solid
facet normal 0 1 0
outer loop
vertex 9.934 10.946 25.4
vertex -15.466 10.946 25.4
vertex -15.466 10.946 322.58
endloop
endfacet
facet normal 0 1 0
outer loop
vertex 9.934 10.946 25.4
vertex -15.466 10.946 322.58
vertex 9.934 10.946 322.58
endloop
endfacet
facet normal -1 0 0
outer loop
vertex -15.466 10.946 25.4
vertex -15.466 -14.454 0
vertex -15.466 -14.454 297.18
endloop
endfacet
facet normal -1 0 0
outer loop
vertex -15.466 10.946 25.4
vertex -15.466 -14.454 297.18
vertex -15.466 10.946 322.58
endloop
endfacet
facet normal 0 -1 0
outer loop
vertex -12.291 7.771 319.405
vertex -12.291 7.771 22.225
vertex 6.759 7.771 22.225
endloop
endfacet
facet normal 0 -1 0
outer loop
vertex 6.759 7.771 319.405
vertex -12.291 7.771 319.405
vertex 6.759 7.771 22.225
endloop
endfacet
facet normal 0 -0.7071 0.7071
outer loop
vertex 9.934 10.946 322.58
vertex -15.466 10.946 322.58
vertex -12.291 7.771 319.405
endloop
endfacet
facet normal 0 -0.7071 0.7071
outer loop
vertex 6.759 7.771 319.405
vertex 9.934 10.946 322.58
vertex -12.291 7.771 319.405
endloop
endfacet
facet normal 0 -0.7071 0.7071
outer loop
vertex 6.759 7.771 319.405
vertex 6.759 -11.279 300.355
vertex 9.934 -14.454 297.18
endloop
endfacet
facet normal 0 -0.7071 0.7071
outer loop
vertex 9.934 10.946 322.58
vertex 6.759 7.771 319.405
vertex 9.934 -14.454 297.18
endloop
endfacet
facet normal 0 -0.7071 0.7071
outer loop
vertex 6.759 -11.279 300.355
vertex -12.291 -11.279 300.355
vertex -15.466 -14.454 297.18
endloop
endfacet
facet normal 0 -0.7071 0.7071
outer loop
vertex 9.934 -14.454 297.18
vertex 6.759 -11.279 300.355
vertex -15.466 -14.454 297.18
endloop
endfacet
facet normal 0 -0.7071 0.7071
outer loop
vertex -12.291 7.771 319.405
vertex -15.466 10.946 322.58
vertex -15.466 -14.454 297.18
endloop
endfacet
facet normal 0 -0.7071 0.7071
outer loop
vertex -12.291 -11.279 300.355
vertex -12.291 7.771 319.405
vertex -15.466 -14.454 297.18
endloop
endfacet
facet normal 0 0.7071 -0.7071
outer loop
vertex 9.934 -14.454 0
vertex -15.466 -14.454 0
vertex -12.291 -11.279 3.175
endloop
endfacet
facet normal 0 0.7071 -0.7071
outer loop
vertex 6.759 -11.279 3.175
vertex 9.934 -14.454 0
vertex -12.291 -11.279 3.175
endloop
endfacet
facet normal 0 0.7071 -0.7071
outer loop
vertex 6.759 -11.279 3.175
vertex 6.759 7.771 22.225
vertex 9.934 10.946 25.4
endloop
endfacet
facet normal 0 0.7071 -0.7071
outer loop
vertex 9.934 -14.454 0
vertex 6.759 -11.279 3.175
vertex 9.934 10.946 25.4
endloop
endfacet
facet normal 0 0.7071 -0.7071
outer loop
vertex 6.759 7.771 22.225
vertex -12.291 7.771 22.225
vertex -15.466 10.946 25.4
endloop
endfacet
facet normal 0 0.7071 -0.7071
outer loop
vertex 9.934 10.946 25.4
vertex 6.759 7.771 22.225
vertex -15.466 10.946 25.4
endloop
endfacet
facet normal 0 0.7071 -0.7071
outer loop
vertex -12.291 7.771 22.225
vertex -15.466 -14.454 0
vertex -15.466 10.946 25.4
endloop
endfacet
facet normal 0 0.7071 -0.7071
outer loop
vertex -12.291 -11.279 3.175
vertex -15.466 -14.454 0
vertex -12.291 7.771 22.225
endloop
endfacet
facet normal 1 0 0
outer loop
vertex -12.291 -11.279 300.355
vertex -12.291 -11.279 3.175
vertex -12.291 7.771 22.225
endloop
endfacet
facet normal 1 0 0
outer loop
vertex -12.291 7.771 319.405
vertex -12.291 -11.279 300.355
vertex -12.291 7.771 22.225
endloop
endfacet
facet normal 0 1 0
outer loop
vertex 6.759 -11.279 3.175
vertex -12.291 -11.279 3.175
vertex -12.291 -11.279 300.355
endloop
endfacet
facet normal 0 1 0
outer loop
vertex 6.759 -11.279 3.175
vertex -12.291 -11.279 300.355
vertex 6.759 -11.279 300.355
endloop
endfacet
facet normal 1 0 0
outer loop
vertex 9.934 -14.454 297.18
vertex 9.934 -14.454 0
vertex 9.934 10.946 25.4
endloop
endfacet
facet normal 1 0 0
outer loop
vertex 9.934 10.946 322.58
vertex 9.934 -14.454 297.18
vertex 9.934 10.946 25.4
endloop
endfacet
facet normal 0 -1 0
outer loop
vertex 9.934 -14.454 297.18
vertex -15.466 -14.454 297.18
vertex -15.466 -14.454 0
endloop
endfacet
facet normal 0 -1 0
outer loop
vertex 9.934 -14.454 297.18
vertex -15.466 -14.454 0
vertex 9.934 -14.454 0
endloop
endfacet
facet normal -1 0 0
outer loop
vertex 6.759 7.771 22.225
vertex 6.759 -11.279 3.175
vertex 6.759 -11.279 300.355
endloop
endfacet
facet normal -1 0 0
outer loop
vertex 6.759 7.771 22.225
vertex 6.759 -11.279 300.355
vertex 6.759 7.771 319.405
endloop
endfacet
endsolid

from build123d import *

# Parameters (mm, degrees)
SKETCH3_W           = 25.4
SKETCH3_H           = 25.4
SKETCH3_W_2         = 19.05
SKETCH3_H_2         = 19.05
BOSS_EXTRUDE2_DEPTH = 322.58
CUT_EXTRUDE2_DEPTH  = 299.72
CUT_EXTRUDE3_DEPTH  = 25.4


with BuildPart() as part:
    # Sketch3 → Boss-Extrude2 (new body)
    with BuildSketch(Plane.XY):
        with Locations((-2.765581944, -1.754080231)):
            Rectangle(SKETCH3_W, SKETCH3_H)
        with Locations((-2.765581944, -1.754080231)):
            Rectangle(SKETCH3_W_2, SKETCH3_H_2, mode=Mode.SUBTRACT)
    extrude(amount=BOSS_EXTRUDE2_DEPTH)

    # Sketch4 → Cut-Extrude2 (cut)
    with BuildSketch(Plane.ZY.offset(15.465581944)):
        Polygon((322.58, 10.945919769), (297.18, -14.454080231), (322.58, -14.454080231), align=None)
    extrude(amount=-CUT_EXTRUDE2_DEPTH, mode=Mode.SUBTRACT)

    # Sketch5 → Cut-Extrude3 (cut)
    with BuildSketch(Plane.ZY.offset(15.465581944)):
        Polygon((0, -14.454080231), (25.4, 10.945919769), (0, 10.945919769), align=None)
    extrude(amount=-CUT_EXTRUDE3_DEPTH, mode=Mode.SUBTRACT)


solid = part.part
